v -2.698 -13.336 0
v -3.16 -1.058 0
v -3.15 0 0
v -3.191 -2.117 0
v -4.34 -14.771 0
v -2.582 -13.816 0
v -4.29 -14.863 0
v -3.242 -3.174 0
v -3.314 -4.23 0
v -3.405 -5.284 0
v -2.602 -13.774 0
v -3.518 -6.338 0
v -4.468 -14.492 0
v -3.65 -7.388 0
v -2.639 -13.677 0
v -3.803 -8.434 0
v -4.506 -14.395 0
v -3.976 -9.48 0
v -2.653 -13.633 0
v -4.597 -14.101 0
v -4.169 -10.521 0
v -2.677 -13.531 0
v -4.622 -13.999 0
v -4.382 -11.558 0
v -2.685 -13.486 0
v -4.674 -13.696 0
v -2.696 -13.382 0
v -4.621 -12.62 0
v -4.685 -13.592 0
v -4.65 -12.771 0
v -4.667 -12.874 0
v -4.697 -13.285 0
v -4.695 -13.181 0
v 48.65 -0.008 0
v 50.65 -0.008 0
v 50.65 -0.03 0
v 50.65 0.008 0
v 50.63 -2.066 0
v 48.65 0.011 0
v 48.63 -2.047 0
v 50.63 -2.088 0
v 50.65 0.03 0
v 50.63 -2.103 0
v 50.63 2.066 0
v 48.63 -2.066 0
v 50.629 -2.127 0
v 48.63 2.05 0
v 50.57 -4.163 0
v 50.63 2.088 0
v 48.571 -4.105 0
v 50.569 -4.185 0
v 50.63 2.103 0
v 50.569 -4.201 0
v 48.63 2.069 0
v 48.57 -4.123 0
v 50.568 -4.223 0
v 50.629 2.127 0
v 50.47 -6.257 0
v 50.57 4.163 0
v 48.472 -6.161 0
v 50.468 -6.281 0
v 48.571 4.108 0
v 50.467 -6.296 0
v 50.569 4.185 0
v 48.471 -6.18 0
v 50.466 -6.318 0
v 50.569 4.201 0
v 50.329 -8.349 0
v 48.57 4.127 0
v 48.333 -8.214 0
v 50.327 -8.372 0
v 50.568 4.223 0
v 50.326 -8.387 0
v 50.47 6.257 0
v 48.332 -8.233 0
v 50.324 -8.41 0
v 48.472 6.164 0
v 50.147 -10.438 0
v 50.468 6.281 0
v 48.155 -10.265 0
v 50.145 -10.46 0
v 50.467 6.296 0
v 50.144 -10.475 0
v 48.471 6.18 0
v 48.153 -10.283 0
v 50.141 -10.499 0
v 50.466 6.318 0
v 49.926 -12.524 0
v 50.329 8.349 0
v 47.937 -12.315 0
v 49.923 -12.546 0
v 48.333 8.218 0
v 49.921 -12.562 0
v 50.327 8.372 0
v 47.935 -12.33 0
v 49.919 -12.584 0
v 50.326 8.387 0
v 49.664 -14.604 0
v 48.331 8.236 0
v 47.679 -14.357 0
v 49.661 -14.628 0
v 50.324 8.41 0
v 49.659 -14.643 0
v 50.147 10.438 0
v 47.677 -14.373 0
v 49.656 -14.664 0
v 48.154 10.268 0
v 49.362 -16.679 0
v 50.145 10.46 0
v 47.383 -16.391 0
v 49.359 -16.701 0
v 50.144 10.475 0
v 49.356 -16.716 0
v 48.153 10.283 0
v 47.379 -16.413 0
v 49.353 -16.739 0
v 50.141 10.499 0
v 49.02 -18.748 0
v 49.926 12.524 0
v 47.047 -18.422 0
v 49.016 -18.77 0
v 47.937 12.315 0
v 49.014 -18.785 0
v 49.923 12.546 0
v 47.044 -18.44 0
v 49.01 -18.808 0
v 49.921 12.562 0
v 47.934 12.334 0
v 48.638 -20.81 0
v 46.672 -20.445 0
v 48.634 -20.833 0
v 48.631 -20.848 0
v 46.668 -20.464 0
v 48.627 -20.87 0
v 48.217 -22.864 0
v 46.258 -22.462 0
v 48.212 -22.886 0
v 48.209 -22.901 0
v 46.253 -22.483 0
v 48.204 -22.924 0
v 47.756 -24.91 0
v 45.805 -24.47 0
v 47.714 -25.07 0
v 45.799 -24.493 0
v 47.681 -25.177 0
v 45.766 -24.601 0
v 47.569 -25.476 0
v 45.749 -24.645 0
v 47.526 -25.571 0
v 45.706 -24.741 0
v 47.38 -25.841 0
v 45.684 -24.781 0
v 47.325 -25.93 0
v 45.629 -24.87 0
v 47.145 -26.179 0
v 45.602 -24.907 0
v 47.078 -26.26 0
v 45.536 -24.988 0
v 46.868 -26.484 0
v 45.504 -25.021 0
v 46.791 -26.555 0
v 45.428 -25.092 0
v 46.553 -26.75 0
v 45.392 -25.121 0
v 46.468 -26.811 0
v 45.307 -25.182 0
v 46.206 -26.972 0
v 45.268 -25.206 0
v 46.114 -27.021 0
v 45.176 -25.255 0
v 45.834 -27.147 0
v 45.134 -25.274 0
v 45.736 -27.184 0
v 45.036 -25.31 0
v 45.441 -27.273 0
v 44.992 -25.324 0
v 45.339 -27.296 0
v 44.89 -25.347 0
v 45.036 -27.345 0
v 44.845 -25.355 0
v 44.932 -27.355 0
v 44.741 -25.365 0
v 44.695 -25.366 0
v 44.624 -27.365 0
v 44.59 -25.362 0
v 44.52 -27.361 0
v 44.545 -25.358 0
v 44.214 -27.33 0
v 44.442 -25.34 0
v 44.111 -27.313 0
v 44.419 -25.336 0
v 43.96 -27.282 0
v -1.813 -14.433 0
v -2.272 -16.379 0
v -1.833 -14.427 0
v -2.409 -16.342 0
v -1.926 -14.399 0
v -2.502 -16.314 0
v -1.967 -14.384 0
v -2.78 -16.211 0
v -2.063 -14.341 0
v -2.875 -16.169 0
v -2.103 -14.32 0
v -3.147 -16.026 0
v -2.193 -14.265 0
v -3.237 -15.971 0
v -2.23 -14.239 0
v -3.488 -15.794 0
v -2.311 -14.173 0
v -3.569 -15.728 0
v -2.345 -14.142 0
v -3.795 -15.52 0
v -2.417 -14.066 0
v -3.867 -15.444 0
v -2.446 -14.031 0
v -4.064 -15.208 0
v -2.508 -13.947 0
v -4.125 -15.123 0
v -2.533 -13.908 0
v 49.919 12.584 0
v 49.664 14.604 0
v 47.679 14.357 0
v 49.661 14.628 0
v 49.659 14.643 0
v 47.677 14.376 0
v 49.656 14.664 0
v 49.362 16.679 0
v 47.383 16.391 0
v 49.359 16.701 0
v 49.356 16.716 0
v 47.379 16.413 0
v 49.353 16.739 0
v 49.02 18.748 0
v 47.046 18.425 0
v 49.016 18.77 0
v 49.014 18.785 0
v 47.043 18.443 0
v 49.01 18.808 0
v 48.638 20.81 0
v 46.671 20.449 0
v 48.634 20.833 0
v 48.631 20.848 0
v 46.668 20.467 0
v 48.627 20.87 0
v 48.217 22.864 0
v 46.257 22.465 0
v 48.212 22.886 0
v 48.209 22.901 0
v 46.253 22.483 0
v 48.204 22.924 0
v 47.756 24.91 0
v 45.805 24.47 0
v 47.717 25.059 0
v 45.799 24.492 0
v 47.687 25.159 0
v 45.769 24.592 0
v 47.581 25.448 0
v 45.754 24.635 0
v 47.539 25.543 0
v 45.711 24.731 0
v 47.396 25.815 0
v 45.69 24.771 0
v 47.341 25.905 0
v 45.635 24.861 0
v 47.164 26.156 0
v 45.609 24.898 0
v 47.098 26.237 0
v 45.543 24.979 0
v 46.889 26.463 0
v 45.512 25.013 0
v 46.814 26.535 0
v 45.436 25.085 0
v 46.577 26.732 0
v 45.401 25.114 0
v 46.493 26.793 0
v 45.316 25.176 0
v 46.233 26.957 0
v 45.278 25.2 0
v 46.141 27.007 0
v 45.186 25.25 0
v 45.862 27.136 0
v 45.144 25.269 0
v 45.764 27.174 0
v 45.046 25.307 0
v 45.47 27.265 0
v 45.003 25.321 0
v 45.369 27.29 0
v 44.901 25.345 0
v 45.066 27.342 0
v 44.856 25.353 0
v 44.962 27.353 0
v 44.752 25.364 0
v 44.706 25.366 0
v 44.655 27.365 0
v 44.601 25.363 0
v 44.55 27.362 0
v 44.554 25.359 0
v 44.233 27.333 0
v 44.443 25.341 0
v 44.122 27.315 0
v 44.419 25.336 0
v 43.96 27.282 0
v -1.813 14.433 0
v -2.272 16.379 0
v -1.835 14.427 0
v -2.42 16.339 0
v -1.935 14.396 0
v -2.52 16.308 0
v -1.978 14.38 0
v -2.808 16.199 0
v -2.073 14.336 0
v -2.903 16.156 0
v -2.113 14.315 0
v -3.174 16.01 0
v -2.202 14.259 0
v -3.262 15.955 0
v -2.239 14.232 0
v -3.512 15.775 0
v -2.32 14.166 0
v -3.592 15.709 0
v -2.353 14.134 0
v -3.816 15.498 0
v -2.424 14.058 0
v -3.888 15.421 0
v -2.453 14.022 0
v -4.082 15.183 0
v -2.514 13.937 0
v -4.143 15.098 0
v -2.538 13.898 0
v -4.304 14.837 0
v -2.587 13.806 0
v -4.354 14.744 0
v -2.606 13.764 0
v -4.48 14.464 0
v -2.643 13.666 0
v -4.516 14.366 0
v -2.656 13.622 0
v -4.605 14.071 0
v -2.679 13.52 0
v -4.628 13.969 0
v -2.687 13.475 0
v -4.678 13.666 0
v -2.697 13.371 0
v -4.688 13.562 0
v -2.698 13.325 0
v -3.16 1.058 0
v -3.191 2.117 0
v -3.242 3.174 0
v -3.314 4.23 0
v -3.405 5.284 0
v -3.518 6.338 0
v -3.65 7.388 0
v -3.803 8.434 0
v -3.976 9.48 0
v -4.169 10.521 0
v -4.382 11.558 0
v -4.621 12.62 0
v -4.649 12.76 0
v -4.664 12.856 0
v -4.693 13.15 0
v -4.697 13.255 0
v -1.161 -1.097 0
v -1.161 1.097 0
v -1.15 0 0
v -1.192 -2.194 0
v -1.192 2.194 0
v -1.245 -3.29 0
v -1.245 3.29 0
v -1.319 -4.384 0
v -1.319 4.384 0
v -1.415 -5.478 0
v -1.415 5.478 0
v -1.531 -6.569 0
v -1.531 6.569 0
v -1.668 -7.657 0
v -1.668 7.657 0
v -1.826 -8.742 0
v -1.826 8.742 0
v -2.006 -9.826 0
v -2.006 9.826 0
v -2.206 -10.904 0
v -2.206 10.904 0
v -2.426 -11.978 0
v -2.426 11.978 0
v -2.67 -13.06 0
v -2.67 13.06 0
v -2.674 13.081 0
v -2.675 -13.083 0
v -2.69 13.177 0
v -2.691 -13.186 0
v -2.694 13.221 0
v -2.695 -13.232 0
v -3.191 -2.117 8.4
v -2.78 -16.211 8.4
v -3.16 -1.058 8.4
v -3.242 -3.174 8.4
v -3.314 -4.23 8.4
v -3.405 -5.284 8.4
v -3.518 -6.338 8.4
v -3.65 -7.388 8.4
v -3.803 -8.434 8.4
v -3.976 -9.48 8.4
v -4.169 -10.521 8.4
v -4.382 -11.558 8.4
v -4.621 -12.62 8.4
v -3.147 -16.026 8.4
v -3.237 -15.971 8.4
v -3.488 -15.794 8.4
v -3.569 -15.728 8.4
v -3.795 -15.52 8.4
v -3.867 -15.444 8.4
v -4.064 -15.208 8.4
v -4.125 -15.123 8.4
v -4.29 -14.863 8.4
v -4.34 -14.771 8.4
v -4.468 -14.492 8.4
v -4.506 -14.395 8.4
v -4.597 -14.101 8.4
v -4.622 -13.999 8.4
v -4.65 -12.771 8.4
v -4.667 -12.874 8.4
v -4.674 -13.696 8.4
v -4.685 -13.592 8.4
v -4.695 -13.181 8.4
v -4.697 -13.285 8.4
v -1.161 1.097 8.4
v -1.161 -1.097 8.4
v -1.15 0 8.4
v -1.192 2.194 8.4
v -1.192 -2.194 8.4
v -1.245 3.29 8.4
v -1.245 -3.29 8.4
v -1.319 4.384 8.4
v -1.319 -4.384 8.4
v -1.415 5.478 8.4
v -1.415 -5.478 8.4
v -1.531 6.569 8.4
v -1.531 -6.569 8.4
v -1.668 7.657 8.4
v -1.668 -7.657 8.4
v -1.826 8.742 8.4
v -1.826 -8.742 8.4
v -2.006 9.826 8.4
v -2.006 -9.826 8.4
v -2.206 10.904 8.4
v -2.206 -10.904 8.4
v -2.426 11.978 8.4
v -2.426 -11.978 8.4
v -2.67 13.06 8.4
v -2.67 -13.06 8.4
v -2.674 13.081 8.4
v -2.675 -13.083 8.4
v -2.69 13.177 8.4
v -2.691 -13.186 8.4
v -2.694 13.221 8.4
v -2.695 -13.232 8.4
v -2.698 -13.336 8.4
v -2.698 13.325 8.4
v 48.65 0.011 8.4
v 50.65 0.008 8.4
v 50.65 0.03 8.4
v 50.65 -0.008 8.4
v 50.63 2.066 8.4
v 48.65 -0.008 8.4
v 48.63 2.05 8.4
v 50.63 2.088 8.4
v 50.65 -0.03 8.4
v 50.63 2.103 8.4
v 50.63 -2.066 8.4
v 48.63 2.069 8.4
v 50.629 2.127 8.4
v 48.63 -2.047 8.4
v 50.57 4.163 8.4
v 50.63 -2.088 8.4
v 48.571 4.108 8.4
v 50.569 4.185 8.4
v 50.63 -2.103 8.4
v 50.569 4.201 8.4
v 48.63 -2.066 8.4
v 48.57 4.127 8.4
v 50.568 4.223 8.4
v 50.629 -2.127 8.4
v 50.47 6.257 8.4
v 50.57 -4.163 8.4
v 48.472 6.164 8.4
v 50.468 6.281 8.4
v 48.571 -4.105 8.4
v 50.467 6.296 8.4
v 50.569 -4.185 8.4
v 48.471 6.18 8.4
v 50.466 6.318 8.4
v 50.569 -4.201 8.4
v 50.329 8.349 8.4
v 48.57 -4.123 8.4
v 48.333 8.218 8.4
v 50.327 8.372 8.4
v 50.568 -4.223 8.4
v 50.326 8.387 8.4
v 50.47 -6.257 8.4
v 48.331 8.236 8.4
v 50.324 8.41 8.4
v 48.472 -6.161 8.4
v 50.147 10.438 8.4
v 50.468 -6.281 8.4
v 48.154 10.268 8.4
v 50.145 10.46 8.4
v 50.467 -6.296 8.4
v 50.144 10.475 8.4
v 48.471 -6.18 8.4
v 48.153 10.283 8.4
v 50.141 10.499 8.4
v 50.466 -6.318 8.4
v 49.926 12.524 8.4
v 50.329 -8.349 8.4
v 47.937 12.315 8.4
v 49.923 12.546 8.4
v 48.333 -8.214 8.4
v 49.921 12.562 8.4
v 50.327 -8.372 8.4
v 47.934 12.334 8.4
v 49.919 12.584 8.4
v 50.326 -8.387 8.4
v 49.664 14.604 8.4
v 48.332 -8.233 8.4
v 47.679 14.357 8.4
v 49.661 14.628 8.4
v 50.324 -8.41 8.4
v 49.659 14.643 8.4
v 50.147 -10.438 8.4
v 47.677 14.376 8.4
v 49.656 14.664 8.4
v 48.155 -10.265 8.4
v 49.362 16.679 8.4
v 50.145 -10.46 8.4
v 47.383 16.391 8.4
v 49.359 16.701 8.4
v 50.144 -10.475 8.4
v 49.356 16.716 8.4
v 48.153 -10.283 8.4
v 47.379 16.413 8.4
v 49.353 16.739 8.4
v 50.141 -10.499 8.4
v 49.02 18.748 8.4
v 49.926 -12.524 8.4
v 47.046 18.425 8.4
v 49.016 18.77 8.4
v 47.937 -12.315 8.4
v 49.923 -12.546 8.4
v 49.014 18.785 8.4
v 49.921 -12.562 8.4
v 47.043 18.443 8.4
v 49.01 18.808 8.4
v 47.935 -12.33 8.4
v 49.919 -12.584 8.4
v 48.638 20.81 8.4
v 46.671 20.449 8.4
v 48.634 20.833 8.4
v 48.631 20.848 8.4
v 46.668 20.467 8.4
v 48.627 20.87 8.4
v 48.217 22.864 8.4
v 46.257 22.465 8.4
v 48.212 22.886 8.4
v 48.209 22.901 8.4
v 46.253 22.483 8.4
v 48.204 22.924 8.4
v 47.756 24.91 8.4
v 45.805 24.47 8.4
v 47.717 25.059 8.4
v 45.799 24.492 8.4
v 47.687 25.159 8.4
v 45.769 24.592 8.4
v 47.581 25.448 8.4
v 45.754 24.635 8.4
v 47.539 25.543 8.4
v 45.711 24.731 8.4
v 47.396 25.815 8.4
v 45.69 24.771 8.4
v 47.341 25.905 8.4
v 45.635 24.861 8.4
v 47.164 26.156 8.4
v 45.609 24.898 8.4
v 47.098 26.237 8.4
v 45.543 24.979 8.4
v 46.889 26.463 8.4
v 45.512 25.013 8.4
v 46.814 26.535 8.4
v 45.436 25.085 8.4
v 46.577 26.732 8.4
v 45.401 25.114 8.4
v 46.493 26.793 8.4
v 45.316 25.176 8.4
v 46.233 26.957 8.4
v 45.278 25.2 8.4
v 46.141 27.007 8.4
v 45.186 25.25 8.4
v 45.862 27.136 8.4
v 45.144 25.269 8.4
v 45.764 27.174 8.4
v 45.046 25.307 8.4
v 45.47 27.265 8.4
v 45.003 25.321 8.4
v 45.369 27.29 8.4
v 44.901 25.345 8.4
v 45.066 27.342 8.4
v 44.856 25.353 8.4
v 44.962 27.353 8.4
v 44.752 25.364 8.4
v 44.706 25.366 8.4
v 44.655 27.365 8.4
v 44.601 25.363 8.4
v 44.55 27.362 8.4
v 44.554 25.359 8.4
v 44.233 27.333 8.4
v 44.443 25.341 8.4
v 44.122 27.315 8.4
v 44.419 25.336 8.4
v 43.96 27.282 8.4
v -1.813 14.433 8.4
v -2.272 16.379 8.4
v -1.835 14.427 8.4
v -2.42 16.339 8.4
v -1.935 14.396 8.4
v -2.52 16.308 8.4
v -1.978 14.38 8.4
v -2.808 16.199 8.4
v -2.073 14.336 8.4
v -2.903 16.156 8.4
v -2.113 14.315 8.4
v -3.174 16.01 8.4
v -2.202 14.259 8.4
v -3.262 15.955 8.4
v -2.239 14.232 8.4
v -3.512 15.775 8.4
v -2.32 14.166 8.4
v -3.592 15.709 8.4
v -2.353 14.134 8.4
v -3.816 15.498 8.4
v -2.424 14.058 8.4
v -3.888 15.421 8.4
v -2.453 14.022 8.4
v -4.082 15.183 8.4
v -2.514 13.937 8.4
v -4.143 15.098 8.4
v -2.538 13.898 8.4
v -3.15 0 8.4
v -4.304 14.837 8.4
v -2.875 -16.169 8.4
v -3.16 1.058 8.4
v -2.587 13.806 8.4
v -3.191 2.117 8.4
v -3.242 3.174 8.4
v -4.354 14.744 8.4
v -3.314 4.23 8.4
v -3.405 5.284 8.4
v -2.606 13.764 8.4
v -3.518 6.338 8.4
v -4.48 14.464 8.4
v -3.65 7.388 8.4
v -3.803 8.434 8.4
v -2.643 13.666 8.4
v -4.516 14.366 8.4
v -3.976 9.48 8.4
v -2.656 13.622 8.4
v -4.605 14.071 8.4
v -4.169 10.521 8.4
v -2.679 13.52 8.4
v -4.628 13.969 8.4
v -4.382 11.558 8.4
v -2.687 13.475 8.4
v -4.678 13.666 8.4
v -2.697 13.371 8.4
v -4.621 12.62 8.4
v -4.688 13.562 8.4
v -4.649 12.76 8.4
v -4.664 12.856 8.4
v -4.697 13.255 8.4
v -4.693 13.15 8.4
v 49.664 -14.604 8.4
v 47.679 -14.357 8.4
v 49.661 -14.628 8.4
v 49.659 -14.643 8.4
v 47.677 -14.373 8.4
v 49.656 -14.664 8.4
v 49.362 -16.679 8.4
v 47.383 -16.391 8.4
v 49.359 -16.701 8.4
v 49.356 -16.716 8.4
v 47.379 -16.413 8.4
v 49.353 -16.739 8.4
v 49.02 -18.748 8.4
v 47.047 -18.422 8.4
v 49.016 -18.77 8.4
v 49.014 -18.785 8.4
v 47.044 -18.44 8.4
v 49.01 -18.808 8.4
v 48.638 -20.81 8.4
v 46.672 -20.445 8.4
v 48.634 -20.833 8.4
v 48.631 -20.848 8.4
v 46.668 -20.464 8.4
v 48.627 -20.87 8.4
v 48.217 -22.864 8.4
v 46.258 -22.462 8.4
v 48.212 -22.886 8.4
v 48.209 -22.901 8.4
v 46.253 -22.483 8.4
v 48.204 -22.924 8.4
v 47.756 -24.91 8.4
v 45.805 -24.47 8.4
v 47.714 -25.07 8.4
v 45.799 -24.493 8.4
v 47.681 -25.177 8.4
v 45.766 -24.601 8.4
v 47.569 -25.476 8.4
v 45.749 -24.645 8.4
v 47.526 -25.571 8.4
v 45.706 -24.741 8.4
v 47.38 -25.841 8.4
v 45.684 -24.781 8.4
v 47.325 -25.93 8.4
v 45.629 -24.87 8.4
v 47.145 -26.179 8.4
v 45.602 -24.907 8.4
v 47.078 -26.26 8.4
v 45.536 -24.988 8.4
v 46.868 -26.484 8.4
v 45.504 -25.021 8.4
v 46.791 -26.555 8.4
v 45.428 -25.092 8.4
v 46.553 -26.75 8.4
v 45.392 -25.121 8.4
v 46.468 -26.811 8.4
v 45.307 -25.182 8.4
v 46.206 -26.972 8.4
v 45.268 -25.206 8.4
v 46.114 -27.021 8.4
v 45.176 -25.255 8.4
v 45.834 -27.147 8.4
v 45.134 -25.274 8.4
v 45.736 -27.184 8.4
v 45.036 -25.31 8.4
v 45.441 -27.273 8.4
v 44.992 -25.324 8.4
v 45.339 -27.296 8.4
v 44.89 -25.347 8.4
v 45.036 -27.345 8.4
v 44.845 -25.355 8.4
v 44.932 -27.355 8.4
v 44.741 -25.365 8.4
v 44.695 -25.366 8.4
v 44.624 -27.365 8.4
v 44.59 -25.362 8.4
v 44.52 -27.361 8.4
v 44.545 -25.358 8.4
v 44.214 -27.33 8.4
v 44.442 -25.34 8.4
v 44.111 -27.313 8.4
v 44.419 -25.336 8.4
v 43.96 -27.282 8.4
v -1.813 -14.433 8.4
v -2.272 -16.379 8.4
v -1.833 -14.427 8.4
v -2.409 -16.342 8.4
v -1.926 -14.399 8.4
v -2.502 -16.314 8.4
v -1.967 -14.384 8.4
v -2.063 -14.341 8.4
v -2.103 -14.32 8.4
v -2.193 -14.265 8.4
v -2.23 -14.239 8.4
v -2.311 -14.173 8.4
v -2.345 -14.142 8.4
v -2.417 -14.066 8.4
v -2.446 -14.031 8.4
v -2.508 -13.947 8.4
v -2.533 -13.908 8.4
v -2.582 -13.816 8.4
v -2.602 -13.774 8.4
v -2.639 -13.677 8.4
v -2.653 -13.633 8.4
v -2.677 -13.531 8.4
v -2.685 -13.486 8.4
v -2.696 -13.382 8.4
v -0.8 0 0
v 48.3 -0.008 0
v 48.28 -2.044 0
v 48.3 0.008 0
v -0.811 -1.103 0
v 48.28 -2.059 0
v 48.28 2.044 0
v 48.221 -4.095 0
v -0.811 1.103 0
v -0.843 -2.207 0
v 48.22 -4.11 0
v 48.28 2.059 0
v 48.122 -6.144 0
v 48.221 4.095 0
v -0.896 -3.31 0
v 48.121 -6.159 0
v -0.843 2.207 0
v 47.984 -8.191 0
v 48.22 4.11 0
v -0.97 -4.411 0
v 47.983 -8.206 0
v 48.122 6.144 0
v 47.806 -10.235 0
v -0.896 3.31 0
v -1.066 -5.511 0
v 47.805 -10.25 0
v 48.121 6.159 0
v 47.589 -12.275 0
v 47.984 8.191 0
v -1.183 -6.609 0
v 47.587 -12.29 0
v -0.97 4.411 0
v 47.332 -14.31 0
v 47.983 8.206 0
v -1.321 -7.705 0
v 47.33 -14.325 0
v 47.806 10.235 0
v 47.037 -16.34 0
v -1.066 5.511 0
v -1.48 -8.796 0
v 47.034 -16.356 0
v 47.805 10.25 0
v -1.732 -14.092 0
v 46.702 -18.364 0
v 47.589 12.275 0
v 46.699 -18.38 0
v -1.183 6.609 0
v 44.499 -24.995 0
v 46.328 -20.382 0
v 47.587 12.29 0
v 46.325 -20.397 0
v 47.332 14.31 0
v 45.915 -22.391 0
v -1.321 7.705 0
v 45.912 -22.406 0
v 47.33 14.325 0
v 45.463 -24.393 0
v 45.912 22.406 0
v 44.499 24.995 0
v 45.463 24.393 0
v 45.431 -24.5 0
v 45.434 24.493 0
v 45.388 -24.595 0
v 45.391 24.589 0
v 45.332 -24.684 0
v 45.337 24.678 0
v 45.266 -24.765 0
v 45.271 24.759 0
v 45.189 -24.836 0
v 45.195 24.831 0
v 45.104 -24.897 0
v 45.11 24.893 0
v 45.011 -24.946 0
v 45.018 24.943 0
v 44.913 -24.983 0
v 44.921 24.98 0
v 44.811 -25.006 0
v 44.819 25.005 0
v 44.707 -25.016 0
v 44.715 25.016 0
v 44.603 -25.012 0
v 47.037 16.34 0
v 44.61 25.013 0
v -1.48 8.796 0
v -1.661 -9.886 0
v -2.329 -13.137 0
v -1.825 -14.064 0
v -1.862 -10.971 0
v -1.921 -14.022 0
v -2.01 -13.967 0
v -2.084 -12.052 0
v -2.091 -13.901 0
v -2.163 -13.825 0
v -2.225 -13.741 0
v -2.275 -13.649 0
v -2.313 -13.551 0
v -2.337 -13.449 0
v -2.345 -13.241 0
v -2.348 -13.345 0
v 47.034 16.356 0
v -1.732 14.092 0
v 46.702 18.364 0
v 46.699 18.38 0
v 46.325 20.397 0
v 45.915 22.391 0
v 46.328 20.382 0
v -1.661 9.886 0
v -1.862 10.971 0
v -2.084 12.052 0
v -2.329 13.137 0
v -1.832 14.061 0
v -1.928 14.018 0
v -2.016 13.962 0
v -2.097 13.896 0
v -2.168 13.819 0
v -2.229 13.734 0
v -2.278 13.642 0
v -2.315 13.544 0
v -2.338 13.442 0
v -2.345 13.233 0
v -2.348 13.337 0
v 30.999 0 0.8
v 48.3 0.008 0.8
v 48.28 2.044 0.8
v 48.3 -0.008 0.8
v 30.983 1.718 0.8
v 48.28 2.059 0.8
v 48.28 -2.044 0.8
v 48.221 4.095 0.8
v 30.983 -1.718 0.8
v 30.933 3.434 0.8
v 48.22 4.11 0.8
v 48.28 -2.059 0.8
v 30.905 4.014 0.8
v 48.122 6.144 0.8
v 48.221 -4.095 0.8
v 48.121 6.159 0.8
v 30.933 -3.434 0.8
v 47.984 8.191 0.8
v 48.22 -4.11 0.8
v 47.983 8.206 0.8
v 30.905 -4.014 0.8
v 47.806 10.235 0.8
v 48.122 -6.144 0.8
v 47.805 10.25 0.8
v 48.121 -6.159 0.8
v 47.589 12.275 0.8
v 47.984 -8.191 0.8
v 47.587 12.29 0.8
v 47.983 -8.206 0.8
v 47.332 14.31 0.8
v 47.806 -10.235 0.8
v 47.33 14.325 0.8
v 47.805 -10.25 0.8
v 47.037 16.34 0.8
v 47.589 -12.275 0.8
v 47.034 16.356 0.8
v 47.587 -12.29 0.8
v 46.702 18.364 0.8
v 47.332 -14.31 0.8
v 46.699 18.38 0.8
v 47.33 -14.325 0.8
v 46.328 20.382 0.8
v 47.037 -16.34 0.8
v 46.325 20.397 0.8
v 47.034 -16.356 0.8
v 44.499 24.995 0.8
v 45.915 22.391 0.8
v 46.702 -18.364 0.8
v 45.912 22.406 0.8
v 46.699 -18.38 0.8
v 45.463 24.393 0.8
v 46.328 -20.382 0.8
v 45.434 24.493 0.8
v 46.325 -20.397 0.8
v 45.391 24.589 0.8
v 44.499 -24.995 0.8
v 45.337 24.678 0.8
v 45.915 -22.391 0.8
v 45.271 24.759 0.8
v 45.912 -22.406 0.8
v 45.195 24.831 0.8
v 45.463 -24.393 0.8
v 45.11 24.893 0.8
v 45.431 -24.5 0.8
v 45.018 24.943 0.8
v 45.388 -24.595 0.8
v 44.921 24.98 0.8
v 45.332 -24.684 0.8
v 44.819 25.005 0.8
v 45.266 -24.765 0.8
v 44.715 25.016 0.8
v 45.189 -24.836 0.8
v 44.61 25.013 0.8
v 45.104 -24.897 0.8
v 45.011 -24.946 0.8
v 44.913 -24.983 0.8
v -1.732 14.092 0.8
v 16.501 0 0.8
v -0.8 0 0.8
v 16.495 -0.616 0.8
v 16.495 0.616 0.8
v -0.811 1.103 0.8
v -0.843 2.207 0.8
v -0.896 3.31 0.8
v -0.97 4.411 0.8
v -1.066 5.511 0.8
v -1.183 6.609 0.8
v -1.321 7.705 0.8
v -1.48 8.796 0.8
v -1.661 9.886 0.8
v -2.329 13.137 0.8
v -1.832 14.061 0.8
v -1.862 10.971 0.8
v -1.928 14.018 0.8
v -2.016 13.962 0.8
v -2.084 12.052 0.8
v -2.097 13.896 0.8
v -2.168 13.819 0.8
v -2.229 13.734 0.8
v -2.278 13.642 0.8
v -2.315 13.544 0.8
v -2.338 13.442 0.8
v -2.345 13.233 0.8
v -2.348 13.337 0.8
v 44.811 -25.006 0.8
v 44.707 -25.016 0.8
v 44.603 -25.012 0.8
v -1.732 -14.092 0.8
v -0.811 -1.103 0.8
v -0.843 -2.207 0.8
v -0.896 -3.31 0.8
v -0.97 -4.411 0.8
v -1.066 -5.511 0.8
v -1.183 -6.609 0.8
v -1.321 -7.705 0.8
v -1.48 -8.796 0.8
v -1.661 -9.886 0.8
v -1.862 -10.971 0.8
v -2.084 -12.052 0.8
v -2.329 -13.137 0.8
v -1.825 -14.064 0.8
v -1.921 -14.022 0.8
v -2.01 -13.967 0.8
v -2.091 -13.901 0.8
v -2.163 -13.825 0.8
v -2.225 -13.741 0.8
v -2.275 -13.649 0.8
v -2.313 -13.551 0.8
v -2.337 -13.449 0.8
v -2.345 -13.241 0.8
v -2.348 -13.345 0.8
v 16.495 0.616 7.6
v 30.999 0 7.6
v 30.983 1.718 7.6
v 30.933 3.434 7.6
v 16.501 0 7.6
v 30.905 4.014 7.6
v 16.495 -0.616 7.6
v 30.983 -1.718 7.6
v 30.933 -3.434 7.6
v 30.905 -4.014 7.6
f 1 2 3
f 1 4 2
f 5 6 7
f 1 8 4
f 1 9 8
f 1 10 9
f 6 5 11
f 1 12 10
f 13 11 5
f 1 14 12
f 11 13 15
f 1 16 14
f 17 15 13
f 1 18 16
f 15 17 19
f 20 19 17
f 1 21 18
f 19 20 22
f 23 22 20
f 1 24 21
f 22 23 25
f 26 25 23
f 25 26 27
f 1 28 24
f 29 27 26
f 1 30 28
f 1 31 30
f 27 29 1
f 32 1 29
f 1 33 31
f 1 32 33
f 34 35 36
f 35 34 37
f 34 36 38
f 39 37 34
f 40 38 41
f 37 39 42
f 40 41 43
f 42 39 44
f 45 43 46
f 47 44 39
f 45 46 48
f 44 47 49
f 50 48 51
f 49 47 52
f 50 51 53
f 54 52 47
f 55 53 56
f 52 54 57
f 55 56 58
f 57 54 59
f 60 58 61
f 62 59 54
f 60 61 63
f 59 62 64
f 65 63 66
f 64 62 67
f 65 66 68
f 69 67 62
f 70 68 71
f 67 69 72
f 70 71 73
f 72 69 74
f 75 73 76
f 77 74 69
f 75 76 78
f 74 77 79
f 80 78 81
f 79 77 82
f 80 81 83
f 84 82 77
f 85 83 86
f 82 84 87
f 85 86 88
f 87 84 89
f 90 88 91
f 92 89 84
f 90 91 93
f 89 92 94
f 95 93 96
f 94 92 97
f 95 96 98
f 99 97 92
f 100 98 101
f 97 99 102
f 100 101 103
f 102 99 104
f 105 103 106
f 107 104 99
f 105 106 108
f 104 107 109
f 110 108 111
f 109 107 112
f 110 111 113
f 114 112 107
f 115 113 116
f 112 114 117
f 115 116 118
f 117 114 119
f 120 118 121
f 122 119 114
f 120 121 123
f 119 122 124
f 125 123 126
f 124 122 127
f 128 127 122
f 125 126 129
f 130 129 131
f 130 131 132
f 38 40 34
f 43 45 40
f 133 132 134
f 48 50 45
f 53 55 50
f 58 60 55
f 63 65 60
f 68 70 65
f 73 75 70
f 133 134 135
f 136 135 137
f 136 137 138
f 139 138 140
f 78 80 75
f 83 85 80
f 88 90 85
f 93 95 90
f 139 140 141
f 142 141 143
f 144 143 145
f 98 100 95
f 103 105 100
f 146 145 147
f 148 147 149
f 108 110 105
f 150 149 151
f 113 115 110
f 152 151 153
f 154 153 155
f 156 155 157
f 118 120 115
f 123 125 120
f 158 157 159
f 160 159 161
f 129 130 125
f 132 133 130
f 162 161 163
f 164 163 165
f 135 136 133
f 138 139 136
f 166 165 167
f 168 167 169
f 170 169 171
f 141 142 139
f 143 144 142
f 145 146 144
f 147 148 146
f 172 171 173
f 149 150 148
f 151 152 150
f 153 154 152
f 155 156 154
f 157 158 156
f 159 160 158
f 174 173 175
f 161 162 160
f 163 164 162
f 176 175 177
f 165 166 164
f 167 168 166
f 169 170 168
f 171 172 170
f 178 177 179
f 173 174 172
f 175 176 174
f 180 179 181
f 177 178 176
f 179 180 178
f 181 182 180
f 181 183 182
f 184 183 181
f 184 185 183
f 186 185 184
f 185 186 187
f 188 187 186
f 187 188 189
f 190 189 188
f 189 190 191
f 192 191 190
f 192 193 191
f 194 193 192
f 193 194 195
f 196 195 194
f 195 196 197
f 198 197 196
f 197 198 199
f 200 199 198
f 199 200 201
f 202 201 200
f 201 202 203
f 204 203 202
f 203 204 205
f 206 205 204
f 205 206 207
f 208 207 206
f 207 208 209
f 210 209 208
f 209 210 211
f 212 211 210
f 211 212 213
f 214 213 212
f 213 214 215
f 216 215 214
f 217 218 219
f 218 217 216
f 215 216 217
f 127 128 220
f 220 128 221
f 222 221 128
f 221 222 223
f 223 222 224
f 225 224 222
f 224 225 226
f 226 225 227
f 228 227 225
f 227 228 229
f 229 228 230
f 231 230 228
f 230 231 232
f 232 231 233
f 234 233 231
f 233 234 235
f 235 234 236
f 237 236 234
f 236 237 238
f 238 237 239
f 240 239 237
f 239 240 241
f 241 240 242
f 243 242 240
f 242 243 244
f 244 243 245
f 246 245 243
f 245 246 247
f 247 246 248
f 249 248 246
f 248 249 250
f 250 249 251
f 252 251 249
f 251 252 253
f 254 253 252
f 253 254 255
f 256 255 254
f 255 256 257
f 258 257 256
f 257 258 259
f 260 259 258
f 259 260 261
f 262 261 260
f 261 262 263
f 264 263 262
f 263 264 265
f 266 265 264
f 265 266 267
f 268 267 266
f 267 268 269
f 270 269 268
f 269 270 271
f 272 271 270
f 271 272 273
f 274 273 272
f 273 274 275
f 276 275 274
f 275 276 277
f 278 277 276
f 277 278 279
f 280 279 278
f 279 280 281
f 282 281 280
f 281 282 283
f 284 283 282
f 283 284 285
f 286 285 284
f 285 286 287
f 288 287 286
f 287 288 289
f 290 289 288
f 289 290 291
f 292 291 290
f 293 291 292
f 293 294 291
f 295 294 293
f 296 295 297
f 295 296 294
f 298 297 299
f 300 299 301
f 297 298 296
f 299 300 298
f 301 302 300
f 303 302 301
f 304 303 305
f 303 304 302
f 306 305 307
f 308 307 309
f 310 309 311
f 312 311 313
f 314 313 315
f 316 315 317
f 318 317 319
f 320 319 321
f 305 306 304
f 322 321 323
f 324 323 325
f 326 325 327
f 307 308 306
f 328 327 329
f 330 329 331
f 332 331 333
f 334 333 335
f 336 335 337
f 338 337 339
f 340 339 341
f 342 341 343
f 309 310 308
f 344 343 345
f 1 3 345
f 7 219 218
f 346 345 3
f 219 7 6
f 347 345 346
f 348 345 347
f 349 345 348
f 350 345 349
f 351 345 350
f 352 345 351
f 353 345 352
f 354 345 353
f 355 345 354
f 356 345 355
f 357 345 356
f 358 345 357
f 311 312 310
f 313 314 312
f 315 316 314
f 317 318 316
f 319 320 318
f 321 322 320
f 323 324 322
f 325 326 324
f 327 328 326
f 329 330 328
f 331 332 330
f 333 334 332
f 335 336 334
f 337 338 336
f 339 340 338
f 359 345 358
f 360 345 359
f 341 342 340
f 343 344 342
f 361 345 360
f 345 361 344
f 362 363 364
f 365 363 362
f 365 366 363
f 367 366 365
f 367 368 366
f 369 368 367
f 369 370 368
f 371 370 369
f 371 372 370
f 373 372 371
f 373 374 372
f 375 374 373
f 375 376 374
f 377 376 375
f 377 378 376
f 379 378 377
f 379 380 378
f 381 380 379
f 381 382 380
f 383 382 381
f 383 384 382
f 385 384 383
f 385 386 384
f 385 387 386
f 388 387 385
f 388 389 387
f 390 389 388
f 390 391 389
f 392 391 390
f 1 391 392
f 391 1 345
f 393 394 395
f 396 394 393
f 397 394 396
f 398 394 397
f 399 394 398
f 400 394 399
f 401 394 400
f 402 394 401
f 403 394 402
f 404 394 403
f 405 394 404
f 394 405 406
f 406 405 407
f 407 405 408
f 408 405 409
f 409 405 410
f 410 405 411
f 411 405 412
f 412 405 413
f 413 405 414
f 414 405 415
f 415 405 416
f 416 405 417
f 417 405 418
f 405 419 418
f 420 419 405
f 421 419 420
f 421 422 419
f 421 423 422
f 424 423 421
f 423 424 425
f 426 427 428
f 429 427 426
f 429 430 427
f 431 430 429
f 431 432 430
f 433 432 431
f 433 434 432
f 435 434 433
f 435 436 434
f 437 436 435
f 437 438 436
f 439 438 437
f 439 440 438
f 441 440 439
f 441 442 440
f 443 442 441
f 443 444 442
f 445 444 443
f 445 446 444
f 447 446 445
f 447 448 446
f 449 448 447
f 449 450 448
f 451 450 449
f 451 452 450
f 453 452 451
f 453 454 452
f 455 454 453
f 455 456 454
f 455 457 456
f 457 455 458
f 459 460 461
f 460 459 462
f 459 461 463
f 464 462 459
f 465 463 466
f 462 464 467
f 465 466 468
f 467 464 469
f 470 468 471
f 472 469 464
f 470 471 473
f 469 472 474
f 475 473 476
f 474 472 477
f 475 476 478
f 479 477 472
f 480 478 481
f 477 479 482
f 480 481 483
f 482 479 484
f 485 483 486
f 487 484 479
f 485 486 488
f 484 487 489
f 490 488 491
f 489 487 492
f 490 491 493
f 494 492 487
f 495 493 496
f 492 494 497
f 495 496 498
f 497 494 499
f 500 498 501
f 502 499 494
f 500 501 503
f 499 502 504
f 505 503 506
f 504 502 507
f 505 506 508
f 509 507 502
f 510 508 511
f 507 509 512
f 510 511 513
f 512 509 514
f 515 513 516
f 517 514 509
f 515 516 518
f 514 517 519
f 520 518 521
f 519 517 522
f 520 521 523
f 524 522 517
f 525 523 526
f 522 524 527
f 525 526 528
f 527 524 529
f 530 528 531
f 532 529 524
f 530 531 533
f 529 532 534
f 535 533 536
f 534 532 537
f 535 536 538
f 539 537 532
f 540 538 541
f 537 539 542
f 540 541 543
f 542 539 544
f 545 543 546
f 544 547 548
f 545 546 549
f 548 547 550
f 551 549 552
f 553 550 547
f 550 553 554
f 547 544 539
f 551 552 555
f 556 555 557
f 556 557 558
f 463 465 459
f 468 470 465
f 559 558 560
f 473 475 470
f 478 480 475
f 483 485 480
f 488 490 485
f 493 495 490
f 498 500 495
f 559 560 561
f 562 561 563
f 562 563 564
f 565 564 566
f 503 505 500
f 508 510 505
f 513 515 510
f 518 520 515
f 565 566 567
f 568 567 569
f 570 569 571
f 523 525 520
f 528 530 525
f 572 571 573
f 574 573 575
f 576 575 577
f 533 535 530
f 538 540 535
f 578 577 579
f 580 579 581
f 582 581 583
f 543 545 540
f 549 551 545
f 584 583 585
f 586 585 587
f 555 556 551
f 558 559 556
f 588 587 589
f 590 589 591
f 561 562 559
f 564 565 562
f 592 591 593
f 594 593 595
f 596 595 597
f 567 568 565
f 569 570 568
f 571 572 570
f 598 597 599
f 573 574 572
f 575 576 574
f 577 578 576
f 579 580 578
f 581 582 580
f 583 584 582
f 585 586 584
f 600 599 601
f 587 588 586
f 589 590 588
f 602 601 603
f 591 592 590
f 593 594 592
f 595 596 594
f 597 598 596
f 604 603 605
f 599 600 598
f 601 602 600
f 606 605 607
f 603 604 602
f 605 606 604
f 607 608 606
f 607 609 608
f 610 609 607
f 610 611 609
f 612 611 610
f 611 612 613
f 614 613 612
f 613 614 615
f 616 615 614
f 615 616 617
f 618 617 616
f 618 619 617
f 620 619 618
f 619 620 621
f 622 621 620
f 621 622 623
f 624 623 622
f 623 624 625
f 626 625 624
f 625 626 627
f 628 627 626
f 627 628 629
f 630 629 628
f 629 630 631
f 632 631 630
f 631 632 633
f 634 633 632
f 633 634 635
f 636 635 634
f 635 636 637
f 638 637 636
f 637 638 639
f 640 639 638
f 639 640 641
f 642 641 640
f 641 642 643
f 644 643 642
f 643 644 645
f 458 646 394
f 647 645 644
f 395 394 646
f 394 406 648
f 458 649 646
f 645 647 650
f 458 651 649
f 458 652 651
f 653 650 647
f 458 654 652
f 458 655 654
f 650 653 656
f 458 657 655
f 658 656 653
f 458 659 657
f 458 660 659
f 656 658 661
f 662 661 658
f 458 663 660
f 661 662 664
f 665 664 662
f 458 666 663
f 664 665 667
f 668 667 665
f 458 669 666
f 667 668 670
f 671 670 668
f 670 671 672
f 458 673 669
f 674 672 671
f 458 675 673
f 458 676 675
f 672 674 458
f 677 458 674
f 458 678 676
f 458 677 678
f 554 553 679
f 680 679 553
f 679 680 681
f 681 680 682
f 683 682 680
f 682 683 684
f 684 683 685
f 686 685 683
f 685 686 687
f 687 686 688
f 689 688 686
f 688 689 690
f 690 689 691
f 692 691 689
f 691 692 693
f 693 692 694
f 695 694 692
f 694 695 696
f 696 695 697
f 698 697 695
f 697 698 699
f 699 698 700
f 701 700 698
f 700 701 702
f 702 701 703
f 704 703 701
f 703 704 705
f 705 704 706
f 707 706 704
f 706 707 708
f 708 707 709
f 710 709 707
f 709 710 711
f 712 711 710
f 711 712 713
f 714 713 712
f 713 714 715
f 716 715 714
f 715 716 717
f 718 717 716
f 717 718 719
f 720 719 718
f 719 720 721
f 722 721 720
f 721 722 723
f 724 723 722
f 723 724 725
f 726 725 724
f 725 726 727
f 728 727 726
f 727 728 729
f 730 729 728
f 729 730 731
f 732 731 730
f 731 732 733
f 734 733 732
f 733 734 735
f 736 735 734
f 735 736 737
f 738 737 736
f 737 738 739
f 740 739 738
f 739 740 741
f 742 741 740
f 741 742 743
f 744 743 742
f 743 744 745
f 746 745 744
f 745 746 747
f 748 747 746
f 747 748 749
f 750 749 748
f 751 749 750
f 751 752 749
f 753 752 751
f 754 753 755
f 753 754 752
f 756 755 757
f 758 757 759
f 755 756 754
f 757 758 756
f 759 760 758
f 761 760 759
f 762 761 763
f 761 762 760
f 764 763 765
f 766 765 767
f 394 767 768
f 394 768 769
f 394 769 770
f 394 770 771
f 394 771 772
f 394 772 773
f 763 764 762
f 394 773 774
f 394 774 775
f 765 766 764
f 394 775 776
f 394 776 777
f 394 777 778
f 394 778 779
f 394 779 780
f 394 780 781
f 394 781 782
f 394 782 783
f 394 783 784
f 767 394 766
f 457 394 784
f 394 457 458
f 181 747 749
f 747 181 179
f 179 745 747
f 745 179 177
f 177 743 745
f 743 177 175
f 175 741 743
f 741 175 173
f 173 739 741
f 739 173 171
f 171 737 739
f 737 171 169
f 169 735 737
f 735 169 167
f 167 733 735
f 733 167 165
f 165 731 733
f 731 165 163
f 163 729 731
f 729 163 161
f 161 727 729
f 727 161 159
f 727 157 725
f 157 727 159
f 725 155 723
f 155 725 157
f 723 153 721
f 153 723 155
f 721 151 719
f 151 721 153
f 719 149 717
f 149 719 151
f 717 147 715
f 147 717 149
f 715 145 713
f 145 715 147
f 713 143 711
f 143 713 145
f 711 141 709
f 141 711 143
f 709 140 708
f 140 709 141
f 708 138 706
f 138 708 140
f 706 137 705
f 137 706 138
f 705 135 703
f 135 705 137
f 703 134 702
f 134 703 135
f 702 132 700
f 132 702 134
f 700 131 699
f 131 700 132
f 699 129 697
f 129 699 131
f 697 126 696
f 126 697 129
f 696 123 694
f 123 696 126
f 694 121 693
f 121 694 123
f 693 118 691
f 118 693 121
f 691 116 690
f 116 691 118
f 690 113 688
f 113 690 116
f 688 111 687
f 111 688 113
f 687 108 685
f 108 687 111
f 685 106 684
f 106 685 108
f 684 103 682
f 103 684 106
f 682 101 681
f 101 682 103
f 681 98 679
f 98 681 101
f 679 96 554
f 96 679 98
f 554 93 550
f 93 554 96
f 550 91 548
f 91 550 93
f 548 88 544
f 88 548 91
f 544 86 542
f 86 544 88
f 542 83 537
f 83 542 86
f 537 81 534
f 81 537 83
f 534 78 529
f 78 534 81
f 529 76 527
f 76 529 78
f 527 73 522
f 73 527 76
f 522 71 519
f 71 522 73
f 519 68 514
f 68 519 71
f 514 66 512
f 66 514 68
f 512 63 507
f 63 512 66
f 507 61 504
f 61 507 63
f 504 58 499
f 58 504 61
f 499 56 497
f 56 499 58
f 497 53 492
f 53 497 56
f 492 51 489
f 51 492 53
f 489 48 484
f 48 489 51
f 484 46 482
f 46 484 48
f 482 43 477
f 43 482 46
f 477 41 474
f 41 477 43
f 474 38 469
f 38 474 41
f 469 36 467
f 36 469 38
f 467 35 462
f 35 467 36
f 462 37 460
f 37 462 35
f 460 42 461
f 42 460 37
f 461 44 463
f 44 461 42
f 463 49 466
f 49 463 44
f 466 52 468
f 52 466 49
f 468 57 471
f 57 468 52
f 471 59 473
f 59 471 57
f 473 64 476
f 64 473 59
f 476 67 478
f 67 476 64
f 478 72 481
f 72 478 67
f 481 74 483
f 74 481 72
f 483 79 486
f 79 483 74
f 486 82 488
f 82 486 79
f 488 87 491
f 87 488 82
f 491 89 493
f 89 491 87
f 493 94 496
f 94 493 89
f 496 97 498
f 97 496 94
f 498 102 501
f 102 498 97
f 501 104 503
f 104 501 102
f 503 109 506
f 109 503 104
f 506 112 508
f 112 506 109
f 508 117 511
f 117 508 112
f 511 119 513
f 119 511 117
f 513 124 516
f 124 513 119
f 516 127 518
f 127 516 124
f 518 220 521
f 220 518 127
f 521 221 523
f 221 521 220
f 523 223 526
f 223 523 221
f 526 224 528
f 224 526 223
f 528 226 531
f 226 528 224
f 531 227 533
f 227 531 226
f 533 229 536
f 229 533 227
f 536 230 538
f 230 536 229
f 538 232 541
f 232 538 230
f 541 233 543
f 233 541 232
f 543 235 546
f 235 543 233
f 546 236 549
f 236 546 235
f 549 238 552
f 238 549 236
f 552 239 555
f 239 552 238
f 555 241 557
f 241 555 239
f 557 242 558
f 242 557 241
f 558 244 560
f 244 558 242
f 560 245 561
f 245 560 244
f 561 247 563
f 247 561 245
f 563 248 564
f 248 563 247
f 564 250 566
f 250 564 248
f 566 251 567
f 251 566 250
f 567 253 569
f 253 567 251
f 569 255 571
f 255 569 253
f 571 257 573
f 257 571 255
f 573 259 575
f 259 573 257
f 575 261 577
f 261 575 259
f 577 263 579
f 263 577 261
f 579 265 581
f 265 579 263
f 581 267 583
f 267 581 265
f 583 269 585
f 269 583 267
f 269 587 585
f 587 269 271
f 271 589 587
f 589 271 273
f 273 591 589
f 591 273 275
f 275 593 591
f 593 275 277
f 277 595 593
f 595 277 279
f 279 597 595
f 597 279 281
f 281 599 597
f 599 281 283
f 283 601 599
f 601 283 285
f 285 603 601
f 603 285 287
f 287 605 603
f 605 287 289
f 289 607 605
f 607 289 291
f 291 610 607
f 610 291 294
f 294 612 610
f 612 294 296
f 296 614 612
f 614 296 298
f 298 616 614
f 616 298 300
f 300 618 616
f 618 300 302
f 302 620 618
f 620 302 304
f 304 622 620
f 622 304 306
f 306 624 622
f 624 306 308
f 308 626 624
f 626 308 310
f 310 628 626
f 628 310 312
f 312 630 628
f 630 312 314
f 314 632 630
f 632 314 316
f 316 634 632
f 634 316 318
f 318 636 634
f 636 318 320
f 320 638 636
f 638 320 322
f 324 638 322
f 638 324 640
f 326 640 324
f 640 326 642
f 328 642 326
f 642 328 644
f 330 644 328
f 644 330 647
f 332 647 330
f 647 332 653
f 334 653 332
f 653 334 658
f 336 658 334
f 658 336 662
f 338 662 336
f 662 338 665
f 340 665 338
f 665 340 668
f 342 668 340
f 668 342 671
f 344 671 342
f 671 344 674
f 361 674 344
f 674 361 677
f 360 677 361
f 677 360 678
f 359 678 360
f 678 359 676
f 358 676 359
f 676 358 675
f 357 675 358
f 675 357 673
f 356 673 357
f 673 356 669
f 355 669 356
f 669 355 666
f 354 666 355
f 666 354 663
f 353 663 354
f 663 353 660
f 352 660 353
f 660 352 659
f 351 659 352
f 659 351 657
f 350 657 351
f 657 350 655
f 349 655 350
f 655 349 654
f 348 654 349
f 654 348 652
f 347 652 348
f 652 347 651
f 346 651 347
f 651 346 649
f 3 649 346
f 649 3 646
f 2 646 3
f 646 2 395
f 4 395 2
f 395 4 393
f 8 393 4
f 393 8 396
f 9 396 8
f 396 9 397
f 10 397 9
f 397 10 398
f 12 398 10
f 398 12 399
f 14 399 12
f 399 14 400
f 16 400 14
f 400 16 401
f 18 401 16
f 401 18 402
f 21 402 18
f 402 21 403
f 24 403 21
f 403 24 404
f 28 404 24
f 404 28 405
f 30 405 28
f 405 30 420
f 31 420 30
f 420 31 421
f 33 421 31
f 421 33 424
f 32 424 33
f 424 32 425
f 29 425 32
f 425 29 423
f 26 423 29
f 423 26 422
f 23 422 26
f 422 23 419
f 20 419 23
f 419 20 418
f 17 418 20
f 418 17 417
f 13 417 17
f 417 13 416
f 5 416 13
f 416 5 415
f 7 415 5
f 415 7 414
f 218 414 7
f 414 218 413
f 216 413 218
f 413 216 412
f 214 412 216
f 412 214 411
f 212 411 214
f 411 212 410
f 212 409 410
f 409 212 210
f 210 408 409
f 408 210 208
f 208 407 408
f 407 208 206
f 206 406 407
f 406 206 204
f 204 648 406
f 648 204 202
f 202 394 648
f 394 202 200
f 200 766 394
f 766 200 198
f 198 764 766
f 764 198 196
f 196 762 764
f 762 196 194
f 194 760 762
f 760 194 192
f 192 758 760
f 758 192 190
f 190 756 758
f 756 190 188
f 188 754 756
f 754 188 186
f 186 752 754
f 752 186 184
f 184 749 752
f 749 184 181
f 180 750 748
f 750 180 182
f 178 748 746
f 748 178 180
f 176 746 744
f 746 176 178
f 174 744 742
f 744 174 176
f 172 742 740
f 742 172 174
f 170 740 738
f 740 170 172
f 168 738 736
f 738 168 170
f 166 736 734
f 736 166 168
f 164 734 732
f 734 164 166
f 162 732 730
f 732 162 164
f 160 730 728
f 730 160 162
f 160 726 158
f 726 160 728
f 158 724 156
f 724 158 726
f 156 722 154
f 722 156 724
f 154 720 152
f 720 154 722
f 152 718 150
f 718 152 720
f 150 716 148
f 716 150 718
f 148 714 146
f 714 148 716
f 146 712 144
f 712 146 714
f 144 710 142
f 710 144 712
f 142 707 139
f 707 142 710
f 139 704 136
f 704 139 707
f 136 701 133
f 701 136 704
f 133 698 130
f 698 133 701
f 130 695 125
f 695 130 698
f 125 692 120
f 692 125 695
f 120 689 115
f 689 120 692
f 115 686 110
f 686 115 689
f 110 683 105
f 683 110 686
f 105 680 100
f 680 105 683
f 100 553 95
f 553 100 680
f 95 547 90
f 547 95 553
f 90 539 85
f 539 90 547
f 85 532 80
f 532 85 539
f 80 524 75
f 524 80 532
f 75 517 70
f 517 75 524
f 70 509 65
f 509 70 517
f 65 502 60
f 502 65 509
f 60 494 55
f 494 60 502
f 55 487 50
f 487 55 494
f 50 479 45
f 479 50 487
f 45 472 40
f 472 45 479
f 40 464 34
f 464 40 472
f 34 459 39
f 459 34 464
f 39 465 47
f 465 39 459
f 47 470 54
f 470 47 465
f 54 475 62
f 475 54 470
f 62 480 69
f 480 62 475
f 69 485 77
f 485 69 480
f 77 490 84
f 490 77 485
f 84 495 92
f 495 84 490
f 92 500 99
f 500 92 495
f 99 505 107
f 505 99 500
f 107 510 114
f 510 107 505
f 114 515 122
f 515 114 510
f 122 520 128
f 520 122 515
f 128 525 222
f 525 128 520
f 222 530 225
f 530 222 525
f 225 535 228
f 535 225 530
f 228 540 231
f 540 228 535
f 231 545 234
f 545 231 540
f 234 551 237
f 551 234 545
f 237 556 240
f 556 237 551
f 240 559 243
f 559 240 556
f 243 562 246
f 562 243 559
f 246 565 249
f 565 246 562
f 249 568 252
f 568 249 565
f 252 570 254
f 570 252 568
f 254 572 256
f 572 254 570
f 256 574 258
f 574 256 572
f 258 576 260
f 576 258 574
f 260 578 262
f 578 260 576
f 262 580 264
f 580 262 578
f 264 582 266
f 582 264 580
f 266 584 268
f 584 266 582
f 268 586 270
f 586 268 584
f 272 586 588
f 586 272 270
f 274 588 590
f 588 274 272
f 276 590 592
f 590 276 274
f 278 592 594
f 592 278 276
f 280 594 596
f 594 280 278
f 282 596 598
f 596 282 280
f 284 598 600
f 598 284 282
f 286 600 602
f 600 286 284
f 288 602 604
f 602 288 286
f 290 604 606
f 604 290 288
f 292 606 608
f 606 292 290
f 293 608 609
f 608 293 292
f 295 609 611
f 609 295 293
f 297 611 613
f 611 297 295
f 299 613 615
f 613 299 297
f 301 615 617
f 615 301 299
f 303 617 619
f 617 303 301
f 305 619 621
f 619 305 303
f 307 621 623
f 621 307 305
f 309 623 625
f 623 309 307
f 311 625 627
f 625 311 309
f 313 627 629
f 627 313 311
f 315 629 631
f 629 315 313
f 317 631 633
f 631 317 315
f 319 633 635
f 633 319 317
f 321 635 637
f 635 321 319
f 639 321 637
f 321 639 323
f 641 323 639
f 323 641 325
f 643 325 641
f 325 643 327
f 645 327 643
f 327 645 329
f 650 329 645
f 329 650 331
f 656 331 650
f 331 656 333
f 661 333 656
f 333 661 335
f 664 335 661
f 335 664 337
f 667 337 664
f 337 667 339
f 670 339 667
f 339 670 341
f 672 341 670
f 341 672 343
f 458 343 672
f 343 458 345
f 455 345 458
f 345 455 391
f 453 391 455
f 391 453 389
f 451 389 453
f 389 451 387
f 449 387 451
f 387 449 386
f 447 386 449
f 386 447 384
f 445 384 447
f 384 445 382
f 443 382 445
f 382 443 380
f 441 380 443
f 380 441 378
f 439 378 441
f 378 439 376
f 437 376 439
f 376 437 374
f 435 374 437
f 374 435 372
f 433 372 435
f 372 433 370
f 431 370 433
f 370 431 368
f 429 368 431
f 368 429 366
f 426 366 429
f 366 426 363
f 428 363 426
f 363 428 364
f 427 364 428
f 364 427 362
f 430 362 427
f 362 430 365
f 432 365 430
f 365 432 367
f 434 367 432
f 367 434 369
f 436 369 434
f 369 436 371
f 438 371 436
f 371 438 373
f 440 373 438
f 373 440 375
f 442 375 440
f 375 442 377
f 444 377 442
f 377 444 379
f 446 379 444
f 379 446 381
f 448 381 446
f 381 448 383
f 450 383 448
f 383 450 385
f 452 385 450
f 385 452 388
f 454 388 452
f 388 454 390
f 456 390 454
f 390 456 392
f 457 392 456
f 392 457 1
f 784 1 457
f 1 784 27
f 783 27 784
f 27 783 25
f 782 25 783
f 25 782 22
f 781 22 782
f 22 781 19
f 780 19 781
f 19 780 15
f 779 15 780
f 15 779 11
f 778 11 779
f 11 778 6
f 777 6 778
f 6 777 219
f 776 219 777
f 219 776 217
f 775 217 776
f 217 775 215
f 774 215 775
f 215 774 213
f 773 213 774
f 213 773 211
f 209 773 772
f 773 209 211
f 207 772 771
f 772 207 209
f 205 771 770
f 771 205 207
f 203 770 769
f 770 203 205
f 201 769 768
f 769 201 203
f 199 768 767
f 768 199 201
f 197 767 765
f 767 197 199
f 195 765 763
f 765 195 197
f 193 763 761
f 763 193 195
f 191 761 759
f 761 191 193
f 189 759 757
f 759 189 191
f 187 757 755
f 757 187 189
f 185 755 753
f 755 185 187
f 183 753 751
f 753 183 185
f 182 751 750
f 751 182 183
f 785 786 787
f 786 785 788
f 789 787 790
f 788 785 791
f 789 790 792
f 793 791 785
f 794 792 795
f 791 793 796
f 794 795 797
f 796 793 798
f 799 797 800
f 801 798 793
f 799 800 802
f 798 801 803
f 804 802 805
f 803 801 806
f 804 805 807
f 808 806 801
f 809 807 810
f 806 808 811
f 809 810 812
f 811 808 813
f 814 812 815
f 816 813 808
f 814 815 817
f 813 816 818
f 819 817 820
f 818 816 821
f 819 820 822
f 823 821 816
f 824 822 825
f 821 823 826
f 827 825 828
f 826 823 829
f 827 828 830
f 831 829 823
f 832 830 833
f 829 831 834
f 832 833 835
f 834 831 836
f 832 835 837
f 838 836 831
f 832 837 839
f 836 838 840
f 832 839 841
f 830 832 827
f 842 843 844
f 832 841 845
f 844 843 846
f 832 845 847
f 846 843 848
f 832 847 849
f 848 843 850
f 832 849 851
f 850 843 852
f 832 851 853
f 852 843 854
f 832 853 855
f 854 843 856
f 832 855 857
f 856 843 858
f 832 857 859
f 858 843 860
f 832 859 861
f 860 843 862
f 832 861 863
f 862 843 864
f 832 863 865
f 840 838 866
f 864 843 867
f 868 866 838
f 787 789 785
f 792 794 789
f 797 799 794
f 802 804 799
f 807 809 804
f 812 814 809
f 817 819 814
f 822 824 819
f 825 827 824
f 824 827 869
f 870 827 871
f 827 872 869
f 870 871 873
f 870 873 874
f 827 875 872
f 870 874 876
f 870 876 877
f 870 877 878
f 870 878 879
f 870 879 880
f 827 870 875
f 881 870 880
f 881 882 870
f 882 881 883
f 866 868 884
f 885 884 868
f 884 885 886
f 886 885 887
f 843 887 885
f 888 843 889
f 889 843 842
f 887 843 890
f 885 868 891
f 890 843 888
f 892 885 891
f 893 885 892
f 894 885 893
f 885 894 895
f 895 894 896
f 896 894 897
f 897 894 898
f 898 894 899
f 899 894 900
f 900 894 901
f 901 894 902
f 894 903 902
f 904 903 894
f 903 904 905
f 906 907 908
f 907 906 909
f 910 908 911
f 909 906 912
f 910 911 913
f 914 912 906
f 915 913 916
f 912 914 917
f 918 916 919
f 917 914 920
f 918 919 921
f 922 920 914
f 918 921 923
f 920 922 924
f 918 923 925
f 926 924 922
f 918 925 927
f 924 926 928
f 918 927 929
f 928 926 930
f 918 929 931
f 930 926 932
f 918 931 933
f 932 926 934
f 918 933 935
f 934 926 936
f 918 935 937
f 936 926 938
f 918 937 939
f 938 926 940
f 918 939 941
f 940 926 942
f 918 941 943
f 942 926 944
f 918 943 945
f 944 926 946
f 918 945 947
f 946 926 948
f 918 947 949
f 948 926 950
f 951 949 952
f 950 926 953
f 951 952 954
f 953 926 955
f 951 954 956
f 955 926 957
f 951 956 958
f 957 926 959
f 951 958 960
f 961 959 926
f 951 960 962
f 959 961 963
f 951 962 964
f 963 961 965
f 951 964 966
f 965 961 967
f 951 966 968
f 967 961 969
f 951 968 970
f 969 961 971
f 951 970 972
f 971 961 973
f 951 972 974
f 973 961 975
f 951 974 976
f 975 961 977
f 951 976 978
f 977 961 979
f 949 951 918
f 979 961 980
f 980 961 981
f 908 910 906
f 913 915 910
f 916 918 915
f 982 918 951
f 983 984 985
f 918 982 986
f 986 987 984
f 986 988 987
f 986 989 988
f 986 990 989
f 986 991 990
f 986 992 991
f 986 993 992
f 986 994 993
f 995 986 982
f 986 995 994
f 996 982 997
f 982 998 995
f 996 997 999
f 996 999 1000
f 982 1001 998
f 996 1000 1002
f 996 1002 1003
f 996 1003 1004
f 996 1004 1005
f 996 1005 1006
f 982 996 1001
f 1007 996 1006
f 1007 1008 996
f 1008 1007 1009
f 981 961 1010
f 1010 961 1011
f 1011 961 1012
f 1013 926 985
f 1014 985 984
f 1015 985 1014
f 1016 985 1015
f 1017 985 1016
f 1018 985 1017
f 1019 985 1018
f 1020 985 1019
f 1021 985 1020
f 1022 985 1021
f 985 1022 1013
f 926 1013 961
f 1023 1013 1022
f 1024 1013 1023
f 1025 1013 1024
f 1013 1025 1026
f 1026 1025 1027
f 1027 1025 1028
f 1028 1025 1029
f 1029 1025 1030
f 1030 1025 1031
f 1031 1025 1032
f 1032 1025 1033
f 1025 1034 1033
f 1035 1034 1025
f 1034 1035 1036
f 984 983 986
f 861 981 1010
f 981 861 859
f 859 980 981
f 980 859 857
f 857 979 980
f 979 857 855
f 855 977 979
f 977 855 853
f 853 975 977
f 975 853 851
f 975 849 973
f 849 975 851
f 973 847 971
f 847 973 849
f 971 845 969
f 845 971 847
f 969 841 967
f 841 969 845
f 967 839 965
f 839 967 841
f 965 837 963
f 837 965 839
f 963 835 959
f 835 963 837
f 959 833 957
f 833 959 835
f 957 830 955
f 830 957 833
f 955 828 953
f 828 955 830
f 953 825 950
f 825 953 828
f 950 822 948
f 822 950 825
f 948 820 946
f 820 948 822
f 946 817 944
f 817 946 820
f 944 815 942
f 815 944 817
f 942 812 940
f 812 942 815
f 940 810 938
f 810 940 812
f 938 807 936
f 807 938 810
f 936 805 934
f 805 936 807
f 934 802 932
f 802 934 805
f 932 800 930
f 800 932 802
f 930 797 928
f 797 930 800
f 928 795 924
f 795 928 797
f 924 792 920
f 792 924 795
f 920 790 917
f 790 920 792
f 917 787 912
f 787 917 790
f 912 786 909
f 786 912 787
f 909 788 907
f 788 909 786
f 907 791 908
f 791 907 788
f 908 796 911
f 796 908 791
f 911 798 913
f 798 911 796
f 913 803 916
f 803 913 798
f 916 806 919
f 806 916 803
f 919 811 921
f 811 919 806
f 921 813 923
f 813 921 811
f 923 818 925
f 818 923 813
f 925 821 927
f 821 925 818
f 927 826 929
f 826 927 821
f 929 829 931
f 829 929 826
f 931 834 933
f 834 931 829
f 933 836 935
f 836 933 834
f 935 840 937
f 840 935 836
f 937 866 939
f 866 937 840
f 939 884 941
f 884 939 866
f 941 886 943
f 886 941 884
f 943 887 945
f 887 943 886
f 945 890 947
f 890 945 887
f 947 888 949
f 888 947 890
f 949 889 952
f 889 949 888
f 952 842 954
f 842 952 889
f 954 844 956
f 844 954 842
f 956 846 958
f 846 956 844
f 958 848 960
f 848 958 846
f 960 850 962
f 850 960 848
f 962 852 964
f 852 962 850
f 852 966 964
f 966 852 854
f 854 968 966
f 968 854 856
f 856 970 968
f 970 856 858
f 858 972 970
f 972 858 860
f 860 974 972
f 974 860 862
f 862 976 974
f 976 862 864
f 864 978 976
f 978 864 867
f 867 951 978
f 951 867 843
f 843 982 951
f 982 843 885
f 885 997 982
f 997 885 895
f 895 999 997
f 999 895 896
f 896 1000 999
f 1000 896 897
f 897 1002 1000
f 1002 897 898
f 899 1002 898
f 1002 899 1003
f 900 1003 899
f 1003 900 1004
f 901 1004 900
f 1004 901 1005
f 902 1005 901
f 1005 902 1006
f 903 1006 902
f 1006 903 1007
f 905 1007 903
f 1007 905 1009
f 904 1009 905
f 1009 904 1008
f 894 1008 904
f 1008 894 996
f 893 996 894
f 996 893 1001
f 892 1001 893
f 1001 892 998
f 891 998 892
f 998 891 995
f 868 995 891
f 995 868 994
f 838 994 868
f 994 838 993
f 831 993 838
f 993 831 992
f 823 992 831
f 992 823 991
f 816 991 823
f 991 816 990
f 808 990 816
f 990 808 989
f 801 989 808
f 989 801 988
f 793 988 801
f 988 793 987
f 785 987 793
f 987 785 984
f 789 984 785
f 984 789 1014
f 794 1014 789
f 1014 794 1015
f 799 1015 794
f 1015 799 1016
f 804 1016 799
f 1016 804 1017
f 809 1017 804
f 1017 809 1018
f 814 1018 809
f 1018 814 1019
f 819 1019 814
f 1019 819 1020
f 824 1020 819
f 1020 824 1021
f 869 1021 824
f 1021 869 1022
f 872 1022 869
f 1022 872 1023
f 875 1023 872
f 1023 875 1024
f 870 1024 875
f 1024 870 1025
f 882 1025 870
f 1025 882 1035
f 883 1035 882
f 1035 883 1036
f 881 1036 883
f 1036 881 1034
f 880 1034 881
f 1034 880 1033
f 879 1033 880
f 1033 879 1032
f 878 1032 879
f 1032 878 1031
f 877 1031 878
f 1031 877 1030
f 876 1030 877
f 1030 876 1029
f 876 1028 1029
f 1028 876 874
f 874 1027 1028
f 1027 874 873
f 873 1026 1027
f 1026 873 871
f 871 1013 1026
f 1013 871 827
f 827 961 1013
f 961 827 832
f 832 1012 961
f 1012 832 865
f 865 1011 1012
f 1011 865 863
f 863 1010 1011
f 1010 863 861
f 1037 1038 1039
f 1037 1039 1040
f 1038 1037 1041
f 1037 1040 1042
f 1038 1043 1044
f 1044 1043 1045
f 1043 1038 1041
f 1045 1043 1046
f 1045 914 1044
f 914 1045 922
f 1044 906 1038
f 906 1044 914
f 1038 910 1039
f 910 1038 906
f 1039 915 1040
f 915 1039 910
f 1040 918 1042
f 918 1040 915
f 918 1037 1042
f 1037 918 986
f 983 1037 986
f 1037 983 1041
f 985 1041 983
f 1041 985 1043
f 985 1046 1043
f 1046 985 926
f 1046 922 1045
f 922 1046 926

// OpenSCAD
// Gen-CS — fit coupon (bay part): O20/O5 THROUGH pockets at carrier thickness (test on a steel offcut), 608 seat,
// D-flat bore, gap shim, and one bobbin-bay slice (bobbin footprint + bay_clear) to test former fit.
include <parameters.scad>;
$fn = 48;
// D-flat keyed bore: flat faces +X (angle 0 = magnet pocket 0 = index notch)
module dflat_bore(h) {
    intersection() {
        cylinder(d=shaft_bore, h=h);
        translate([-shaft_bore, -shaft_bore, 0]) cube([shaft_bore + dflat_x, 2*shaft_bore, h]);
    }
}
module sector_2d(r_in, r_out, ang) {
    polygon([
        for (a = [-ang/2 : ang/24 : ang/2]) [r_in*cos(a), r_in*sin(a)],
        for (a = [ang/2 : -ang/24 : -ang/2]) [r_out*cos(a), r_out*sin(a)]
    ]);
}
module footprint_2d() { offset(r=wall) sector_2d(coil_id_r, coil_od_r, span_deg); }
module hub_2d()       { offset(delta=-coil_core_inset) sector_2d(coil_id_r, coil_od_r, span_deg); }

// bay slice at FULL stator thickness with one bobbin BASE printed IN PLACE inside it (bay_clear gap): this is the
// print-in-place test for the one-plate stator. After printing, the base must pop out with finger pressure; if it is fused,
// print coil_former.stl separately (print-packs/parts/) instead of using the in-place bases.
translate([-coil_id_r, 0, 0]) {
    difference() {
        linear_extrude(stator_thick) offset(r=bay_clear + 2) footprint_2d();
        translate([0, 0, -0.1]) linear_extrude(stator_thick + 0.2) offset(r=bay_clear) footprint_2d();
    }
    union() {
        linear_extrude(flange_t) footprint_2d();
        translate([0, 0, flange_t - 0.01]) linear_extrude(former_web + 0.01) hub_2d();
    }
}
